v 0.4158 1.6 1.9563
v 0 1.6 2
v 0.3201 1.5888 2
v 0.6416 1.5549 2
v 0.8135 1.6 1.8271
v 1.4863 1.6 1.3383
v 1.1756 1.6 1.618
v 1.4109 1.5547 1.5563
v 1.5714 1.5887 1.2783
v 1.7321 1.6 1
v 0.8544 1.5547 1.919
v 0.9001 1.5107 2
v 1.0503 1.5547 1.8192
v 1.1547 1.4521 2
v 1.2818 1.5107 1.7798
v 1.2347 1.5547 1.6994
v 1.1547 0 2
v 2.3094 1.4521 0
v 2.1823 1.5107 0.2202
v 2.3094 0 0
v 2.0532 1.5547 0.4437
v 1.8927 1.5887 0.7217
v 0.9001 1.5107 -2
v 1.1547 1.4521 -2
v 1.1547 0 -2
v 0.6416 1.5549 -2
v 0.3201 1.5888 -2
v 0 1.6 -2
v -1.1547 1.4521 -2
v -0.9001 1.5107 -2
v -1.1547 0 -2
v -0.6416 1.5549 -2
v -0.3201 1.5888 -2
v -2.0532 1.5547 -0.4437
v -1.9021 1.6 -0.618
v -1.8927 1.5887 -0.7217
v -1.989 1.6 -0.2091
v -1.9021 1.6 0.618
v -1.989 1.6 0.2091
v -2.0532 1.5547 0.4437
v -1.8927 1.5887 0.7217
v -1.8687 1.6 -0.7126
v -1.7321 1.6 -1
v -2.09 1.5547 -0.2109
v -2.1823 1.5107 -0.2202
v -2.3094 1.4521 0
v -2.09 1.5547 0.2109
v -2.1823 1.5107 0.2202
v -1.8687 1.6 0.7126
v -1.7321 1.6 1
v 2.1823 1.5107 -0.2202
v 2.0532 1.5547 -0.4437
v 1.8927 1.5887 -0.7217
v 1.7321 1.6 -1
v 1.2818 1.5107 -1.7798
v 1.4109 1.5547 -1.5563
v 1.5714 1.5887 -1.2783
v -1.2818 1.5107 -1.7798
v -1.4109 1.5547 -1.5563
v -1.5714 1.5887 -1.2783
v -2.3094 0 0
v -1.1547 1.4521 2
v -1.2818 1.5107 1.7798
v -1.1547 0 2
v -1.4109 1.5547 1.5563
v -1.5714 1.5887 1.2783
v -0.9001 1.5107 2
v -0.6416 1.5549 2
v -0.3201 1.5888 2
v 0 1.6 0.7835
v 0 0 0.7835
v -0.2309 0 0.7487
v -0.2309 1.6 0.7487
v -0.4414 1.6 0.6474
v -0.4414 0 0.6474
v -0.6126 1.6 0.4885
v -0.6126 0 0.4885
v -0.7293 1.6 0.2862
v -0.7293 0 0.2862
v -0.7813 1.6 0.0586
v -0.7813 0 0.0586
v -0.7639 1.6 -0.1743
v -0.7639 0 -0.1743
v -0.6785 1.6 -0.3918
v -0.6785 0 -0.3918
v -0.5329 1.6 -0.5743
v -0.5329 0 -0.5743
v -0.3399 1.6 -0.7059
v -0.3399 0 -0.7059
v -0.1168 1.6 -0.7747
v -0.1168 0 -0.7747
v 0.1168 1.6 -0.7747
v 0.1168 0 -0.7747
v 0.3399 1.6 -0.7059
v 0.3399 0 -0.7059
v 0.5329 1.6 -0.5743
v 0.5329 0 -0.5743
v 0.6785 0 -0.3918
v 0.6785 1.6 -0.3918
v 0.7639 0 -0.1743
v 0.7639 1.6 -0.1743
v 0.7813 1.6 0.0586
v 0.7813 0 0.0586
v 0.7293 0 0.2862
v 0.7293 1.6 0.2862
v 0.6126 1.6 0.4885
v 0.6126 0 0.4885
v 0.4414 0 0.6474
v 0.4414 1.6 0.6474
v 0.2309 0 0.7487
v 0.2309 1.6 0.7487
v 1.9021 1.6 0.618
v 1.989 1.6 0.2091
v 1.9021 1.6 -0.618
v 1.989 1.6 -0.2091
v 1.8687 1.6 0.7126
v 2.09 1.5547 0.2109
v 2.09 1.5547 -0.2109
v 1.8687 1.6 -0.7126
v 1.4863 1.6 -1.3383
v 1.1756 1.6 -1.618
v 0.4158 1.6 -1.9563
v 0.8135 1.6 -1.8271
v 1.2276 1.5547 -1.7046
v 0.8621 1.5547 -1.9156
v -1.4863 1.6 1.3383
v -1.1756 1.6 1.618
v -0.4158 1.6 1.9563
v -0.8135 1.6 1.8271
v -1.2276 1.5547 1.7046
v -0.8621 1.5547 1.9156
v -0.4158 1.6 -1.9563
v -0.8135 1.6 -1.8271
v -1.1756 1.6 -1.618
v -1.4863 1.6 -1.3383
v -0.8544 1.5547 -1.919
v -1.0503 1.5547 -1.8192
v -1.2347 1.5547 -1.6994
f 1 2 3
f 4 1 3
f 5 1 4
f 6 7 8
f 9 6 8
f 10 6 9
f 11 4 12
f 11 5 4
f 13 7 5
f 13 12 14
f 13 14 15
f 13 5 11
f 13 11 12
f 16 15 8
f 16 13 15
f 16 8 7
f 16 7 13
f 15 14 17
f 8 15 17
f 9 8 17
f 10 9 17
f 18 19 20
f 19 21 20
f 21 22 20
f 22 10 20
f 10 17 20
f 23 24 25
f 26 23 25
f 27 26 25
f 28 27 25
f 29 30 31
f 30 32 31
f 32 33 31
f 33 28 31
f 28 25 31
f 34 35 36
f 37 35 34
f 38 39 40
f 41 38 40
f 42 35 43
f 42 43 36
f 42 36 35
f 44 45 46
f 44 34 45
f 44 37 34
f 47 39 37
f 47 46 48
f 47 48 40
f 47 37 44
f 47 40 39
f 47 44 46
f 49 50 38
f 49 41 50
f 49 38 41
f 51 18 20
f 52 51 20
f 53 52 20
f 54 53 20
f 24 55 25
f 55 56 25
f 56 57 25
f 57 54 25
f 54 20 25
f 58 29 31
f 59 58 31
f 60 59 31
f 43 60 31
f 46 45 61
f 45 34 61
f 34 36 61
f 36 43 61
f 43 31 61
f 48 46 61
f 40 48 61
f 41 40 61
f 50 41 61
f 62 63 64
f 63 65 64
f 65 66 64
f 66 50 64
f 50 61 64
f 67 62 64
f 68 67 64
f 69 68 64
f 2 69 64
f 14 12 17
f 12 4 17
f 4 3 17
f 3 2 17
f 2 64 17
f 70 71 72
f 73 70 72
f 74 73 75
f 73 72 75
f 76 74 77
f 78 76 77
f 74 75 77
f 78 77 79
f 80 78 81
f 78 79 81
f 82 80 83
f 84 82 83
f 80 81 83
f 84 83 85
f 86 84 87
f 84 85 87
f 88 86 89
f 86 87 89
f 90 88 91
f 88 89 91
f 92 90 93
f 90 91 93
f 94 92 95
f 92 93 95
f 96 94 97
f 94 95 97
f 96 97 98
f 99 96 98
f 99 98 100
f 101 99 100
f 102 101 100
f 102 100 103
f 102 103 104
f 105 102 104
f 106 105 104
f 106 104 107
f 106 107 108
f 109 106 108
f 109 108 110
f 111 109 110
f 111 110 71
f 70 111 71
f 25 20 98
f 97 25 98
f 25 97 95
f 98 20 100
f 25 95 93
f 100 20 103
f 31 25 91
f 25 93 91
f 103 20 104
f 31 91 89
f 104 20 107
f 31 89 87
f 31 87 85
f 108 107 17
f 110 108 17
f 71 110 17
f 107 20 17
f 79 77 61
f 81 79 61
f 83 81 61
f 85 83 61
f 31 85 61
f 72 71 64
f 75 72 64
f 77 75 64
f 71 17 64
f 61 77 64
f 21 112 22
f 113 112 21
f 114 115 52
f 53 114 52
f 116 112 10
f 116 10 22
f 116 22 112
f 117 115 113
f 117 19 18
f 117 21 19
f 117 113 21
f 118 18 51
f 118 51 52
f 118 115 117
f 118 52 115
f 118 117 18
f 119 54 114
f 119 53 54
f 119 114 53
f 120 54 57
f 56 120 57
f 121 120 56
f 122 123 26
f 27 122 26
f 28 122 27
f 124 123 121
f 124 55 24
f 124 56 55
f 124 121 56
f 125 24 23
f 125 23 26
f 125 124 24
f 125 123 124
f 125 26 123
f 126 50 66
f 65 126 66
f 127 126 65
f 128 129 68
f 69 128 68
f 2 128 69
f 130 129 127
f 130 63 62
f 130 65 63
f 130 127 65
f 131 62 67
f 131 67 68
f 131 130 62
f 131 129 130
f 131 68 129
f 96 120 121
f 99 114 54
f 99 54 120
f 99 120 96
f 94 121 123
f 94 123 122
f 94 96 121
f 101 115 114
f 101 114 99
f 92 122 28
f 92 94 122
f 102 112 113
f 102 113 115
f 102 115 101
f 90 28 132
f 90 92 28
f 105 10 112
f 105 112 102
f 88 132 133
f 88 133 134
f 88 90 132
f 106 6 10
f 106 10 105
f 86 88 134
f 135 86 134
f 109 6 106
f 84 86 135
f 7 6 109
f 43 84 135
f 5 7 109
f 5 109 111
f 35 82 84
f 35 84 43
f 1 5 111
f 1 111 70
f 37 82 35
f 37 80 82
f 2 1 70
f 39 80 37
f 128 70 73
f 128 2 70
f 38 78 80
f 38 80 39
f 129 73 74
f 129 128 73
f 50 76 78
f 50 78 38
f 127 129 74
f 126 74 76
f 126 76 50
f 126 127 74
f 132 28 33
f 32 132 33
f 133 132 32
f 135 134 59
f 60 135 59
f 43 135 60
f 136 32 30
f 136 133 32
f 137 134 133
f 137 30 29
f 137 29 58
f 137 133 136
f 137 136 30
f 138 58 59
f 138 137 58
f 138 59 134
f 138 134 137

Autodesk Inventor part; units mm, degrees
ref_plane "YZ Plane" through (0, 0, 0) normal (1, 0, 0) x (0, 1, 0)
ref_plane "XZ Plane" through (0, 0, 0) normal (0, 1, 0) x (-1, 0, 0)
ref_plane "XY Plane" through (0, 0, 0) normal (0, 0, 1) x (1, 0, 0)
sketch "スケッチ1" plane through (0, 0, 0) normal (0, 1, 0) x (-1, 0, 0)
  circle A0 centre (0, 0) radius 2.3094 construction
  line L0 (2.3094, 0) -> (1.1547, 2)
  line L1 (1.1547, 2) -> (-1.1547, 2)
  line L2 (-1.1547, 2) -> (-2.3094, 0)
  line L3 (-2.3094, 0) -> (-1.1547, -2)
  line L4 (-1.1547, -2) -> (1.1547, -2)
  line L5 (1.1547, -2) -> (2.3094, 0)
  dimension "d0" = 4
extrude "押し出し1" add sketch "スケッチ1" along normal blind 1.6
sketch "スケッチ2" plane through (0, 1.6, 0) normal (0, 1, 0) x (1, 0, 0)
  point P0 (0, 0)
  point P1 (0, 0)
hole "穴1" at (0, 1.6, 0) direction (0, -1, 0) diameter 1.567 end through all thread size "M2x0.4" class "6H" standard "ISO Metric profile"
sketch "スケッチ3" plane through (0, 0, 0) normal (1, 0, 0) x (0, 1, 0)
  arc A0 (1.0174, -3) -> (1.6, -2) centre (-2.9826, 0) ccw
  line L0 (0, -2) -> (1.6, -2) construction
  line L1 (1.6, -3) -> (1.0174, -3)
  line L2 (1.6, 0.7835) -> (1.6, -0.7835) construction
  line L3 (1.6, -2) -> (1.6, -3)
  line L4 (-3.9049, 0) -> (2.5514, 0) projected
  point P0 (0, 0)
  point P1 (1.6, 0)
  dimension "d10" = 2
  dimension "d11" = 5
  dimension "d12" = 1
revolve "回転1" cut sketch "スケッチ3" angle 360 about axis through (0, -10, 0) along (0, 1, 0)
properties part number "M3-HexaNut-type2"
